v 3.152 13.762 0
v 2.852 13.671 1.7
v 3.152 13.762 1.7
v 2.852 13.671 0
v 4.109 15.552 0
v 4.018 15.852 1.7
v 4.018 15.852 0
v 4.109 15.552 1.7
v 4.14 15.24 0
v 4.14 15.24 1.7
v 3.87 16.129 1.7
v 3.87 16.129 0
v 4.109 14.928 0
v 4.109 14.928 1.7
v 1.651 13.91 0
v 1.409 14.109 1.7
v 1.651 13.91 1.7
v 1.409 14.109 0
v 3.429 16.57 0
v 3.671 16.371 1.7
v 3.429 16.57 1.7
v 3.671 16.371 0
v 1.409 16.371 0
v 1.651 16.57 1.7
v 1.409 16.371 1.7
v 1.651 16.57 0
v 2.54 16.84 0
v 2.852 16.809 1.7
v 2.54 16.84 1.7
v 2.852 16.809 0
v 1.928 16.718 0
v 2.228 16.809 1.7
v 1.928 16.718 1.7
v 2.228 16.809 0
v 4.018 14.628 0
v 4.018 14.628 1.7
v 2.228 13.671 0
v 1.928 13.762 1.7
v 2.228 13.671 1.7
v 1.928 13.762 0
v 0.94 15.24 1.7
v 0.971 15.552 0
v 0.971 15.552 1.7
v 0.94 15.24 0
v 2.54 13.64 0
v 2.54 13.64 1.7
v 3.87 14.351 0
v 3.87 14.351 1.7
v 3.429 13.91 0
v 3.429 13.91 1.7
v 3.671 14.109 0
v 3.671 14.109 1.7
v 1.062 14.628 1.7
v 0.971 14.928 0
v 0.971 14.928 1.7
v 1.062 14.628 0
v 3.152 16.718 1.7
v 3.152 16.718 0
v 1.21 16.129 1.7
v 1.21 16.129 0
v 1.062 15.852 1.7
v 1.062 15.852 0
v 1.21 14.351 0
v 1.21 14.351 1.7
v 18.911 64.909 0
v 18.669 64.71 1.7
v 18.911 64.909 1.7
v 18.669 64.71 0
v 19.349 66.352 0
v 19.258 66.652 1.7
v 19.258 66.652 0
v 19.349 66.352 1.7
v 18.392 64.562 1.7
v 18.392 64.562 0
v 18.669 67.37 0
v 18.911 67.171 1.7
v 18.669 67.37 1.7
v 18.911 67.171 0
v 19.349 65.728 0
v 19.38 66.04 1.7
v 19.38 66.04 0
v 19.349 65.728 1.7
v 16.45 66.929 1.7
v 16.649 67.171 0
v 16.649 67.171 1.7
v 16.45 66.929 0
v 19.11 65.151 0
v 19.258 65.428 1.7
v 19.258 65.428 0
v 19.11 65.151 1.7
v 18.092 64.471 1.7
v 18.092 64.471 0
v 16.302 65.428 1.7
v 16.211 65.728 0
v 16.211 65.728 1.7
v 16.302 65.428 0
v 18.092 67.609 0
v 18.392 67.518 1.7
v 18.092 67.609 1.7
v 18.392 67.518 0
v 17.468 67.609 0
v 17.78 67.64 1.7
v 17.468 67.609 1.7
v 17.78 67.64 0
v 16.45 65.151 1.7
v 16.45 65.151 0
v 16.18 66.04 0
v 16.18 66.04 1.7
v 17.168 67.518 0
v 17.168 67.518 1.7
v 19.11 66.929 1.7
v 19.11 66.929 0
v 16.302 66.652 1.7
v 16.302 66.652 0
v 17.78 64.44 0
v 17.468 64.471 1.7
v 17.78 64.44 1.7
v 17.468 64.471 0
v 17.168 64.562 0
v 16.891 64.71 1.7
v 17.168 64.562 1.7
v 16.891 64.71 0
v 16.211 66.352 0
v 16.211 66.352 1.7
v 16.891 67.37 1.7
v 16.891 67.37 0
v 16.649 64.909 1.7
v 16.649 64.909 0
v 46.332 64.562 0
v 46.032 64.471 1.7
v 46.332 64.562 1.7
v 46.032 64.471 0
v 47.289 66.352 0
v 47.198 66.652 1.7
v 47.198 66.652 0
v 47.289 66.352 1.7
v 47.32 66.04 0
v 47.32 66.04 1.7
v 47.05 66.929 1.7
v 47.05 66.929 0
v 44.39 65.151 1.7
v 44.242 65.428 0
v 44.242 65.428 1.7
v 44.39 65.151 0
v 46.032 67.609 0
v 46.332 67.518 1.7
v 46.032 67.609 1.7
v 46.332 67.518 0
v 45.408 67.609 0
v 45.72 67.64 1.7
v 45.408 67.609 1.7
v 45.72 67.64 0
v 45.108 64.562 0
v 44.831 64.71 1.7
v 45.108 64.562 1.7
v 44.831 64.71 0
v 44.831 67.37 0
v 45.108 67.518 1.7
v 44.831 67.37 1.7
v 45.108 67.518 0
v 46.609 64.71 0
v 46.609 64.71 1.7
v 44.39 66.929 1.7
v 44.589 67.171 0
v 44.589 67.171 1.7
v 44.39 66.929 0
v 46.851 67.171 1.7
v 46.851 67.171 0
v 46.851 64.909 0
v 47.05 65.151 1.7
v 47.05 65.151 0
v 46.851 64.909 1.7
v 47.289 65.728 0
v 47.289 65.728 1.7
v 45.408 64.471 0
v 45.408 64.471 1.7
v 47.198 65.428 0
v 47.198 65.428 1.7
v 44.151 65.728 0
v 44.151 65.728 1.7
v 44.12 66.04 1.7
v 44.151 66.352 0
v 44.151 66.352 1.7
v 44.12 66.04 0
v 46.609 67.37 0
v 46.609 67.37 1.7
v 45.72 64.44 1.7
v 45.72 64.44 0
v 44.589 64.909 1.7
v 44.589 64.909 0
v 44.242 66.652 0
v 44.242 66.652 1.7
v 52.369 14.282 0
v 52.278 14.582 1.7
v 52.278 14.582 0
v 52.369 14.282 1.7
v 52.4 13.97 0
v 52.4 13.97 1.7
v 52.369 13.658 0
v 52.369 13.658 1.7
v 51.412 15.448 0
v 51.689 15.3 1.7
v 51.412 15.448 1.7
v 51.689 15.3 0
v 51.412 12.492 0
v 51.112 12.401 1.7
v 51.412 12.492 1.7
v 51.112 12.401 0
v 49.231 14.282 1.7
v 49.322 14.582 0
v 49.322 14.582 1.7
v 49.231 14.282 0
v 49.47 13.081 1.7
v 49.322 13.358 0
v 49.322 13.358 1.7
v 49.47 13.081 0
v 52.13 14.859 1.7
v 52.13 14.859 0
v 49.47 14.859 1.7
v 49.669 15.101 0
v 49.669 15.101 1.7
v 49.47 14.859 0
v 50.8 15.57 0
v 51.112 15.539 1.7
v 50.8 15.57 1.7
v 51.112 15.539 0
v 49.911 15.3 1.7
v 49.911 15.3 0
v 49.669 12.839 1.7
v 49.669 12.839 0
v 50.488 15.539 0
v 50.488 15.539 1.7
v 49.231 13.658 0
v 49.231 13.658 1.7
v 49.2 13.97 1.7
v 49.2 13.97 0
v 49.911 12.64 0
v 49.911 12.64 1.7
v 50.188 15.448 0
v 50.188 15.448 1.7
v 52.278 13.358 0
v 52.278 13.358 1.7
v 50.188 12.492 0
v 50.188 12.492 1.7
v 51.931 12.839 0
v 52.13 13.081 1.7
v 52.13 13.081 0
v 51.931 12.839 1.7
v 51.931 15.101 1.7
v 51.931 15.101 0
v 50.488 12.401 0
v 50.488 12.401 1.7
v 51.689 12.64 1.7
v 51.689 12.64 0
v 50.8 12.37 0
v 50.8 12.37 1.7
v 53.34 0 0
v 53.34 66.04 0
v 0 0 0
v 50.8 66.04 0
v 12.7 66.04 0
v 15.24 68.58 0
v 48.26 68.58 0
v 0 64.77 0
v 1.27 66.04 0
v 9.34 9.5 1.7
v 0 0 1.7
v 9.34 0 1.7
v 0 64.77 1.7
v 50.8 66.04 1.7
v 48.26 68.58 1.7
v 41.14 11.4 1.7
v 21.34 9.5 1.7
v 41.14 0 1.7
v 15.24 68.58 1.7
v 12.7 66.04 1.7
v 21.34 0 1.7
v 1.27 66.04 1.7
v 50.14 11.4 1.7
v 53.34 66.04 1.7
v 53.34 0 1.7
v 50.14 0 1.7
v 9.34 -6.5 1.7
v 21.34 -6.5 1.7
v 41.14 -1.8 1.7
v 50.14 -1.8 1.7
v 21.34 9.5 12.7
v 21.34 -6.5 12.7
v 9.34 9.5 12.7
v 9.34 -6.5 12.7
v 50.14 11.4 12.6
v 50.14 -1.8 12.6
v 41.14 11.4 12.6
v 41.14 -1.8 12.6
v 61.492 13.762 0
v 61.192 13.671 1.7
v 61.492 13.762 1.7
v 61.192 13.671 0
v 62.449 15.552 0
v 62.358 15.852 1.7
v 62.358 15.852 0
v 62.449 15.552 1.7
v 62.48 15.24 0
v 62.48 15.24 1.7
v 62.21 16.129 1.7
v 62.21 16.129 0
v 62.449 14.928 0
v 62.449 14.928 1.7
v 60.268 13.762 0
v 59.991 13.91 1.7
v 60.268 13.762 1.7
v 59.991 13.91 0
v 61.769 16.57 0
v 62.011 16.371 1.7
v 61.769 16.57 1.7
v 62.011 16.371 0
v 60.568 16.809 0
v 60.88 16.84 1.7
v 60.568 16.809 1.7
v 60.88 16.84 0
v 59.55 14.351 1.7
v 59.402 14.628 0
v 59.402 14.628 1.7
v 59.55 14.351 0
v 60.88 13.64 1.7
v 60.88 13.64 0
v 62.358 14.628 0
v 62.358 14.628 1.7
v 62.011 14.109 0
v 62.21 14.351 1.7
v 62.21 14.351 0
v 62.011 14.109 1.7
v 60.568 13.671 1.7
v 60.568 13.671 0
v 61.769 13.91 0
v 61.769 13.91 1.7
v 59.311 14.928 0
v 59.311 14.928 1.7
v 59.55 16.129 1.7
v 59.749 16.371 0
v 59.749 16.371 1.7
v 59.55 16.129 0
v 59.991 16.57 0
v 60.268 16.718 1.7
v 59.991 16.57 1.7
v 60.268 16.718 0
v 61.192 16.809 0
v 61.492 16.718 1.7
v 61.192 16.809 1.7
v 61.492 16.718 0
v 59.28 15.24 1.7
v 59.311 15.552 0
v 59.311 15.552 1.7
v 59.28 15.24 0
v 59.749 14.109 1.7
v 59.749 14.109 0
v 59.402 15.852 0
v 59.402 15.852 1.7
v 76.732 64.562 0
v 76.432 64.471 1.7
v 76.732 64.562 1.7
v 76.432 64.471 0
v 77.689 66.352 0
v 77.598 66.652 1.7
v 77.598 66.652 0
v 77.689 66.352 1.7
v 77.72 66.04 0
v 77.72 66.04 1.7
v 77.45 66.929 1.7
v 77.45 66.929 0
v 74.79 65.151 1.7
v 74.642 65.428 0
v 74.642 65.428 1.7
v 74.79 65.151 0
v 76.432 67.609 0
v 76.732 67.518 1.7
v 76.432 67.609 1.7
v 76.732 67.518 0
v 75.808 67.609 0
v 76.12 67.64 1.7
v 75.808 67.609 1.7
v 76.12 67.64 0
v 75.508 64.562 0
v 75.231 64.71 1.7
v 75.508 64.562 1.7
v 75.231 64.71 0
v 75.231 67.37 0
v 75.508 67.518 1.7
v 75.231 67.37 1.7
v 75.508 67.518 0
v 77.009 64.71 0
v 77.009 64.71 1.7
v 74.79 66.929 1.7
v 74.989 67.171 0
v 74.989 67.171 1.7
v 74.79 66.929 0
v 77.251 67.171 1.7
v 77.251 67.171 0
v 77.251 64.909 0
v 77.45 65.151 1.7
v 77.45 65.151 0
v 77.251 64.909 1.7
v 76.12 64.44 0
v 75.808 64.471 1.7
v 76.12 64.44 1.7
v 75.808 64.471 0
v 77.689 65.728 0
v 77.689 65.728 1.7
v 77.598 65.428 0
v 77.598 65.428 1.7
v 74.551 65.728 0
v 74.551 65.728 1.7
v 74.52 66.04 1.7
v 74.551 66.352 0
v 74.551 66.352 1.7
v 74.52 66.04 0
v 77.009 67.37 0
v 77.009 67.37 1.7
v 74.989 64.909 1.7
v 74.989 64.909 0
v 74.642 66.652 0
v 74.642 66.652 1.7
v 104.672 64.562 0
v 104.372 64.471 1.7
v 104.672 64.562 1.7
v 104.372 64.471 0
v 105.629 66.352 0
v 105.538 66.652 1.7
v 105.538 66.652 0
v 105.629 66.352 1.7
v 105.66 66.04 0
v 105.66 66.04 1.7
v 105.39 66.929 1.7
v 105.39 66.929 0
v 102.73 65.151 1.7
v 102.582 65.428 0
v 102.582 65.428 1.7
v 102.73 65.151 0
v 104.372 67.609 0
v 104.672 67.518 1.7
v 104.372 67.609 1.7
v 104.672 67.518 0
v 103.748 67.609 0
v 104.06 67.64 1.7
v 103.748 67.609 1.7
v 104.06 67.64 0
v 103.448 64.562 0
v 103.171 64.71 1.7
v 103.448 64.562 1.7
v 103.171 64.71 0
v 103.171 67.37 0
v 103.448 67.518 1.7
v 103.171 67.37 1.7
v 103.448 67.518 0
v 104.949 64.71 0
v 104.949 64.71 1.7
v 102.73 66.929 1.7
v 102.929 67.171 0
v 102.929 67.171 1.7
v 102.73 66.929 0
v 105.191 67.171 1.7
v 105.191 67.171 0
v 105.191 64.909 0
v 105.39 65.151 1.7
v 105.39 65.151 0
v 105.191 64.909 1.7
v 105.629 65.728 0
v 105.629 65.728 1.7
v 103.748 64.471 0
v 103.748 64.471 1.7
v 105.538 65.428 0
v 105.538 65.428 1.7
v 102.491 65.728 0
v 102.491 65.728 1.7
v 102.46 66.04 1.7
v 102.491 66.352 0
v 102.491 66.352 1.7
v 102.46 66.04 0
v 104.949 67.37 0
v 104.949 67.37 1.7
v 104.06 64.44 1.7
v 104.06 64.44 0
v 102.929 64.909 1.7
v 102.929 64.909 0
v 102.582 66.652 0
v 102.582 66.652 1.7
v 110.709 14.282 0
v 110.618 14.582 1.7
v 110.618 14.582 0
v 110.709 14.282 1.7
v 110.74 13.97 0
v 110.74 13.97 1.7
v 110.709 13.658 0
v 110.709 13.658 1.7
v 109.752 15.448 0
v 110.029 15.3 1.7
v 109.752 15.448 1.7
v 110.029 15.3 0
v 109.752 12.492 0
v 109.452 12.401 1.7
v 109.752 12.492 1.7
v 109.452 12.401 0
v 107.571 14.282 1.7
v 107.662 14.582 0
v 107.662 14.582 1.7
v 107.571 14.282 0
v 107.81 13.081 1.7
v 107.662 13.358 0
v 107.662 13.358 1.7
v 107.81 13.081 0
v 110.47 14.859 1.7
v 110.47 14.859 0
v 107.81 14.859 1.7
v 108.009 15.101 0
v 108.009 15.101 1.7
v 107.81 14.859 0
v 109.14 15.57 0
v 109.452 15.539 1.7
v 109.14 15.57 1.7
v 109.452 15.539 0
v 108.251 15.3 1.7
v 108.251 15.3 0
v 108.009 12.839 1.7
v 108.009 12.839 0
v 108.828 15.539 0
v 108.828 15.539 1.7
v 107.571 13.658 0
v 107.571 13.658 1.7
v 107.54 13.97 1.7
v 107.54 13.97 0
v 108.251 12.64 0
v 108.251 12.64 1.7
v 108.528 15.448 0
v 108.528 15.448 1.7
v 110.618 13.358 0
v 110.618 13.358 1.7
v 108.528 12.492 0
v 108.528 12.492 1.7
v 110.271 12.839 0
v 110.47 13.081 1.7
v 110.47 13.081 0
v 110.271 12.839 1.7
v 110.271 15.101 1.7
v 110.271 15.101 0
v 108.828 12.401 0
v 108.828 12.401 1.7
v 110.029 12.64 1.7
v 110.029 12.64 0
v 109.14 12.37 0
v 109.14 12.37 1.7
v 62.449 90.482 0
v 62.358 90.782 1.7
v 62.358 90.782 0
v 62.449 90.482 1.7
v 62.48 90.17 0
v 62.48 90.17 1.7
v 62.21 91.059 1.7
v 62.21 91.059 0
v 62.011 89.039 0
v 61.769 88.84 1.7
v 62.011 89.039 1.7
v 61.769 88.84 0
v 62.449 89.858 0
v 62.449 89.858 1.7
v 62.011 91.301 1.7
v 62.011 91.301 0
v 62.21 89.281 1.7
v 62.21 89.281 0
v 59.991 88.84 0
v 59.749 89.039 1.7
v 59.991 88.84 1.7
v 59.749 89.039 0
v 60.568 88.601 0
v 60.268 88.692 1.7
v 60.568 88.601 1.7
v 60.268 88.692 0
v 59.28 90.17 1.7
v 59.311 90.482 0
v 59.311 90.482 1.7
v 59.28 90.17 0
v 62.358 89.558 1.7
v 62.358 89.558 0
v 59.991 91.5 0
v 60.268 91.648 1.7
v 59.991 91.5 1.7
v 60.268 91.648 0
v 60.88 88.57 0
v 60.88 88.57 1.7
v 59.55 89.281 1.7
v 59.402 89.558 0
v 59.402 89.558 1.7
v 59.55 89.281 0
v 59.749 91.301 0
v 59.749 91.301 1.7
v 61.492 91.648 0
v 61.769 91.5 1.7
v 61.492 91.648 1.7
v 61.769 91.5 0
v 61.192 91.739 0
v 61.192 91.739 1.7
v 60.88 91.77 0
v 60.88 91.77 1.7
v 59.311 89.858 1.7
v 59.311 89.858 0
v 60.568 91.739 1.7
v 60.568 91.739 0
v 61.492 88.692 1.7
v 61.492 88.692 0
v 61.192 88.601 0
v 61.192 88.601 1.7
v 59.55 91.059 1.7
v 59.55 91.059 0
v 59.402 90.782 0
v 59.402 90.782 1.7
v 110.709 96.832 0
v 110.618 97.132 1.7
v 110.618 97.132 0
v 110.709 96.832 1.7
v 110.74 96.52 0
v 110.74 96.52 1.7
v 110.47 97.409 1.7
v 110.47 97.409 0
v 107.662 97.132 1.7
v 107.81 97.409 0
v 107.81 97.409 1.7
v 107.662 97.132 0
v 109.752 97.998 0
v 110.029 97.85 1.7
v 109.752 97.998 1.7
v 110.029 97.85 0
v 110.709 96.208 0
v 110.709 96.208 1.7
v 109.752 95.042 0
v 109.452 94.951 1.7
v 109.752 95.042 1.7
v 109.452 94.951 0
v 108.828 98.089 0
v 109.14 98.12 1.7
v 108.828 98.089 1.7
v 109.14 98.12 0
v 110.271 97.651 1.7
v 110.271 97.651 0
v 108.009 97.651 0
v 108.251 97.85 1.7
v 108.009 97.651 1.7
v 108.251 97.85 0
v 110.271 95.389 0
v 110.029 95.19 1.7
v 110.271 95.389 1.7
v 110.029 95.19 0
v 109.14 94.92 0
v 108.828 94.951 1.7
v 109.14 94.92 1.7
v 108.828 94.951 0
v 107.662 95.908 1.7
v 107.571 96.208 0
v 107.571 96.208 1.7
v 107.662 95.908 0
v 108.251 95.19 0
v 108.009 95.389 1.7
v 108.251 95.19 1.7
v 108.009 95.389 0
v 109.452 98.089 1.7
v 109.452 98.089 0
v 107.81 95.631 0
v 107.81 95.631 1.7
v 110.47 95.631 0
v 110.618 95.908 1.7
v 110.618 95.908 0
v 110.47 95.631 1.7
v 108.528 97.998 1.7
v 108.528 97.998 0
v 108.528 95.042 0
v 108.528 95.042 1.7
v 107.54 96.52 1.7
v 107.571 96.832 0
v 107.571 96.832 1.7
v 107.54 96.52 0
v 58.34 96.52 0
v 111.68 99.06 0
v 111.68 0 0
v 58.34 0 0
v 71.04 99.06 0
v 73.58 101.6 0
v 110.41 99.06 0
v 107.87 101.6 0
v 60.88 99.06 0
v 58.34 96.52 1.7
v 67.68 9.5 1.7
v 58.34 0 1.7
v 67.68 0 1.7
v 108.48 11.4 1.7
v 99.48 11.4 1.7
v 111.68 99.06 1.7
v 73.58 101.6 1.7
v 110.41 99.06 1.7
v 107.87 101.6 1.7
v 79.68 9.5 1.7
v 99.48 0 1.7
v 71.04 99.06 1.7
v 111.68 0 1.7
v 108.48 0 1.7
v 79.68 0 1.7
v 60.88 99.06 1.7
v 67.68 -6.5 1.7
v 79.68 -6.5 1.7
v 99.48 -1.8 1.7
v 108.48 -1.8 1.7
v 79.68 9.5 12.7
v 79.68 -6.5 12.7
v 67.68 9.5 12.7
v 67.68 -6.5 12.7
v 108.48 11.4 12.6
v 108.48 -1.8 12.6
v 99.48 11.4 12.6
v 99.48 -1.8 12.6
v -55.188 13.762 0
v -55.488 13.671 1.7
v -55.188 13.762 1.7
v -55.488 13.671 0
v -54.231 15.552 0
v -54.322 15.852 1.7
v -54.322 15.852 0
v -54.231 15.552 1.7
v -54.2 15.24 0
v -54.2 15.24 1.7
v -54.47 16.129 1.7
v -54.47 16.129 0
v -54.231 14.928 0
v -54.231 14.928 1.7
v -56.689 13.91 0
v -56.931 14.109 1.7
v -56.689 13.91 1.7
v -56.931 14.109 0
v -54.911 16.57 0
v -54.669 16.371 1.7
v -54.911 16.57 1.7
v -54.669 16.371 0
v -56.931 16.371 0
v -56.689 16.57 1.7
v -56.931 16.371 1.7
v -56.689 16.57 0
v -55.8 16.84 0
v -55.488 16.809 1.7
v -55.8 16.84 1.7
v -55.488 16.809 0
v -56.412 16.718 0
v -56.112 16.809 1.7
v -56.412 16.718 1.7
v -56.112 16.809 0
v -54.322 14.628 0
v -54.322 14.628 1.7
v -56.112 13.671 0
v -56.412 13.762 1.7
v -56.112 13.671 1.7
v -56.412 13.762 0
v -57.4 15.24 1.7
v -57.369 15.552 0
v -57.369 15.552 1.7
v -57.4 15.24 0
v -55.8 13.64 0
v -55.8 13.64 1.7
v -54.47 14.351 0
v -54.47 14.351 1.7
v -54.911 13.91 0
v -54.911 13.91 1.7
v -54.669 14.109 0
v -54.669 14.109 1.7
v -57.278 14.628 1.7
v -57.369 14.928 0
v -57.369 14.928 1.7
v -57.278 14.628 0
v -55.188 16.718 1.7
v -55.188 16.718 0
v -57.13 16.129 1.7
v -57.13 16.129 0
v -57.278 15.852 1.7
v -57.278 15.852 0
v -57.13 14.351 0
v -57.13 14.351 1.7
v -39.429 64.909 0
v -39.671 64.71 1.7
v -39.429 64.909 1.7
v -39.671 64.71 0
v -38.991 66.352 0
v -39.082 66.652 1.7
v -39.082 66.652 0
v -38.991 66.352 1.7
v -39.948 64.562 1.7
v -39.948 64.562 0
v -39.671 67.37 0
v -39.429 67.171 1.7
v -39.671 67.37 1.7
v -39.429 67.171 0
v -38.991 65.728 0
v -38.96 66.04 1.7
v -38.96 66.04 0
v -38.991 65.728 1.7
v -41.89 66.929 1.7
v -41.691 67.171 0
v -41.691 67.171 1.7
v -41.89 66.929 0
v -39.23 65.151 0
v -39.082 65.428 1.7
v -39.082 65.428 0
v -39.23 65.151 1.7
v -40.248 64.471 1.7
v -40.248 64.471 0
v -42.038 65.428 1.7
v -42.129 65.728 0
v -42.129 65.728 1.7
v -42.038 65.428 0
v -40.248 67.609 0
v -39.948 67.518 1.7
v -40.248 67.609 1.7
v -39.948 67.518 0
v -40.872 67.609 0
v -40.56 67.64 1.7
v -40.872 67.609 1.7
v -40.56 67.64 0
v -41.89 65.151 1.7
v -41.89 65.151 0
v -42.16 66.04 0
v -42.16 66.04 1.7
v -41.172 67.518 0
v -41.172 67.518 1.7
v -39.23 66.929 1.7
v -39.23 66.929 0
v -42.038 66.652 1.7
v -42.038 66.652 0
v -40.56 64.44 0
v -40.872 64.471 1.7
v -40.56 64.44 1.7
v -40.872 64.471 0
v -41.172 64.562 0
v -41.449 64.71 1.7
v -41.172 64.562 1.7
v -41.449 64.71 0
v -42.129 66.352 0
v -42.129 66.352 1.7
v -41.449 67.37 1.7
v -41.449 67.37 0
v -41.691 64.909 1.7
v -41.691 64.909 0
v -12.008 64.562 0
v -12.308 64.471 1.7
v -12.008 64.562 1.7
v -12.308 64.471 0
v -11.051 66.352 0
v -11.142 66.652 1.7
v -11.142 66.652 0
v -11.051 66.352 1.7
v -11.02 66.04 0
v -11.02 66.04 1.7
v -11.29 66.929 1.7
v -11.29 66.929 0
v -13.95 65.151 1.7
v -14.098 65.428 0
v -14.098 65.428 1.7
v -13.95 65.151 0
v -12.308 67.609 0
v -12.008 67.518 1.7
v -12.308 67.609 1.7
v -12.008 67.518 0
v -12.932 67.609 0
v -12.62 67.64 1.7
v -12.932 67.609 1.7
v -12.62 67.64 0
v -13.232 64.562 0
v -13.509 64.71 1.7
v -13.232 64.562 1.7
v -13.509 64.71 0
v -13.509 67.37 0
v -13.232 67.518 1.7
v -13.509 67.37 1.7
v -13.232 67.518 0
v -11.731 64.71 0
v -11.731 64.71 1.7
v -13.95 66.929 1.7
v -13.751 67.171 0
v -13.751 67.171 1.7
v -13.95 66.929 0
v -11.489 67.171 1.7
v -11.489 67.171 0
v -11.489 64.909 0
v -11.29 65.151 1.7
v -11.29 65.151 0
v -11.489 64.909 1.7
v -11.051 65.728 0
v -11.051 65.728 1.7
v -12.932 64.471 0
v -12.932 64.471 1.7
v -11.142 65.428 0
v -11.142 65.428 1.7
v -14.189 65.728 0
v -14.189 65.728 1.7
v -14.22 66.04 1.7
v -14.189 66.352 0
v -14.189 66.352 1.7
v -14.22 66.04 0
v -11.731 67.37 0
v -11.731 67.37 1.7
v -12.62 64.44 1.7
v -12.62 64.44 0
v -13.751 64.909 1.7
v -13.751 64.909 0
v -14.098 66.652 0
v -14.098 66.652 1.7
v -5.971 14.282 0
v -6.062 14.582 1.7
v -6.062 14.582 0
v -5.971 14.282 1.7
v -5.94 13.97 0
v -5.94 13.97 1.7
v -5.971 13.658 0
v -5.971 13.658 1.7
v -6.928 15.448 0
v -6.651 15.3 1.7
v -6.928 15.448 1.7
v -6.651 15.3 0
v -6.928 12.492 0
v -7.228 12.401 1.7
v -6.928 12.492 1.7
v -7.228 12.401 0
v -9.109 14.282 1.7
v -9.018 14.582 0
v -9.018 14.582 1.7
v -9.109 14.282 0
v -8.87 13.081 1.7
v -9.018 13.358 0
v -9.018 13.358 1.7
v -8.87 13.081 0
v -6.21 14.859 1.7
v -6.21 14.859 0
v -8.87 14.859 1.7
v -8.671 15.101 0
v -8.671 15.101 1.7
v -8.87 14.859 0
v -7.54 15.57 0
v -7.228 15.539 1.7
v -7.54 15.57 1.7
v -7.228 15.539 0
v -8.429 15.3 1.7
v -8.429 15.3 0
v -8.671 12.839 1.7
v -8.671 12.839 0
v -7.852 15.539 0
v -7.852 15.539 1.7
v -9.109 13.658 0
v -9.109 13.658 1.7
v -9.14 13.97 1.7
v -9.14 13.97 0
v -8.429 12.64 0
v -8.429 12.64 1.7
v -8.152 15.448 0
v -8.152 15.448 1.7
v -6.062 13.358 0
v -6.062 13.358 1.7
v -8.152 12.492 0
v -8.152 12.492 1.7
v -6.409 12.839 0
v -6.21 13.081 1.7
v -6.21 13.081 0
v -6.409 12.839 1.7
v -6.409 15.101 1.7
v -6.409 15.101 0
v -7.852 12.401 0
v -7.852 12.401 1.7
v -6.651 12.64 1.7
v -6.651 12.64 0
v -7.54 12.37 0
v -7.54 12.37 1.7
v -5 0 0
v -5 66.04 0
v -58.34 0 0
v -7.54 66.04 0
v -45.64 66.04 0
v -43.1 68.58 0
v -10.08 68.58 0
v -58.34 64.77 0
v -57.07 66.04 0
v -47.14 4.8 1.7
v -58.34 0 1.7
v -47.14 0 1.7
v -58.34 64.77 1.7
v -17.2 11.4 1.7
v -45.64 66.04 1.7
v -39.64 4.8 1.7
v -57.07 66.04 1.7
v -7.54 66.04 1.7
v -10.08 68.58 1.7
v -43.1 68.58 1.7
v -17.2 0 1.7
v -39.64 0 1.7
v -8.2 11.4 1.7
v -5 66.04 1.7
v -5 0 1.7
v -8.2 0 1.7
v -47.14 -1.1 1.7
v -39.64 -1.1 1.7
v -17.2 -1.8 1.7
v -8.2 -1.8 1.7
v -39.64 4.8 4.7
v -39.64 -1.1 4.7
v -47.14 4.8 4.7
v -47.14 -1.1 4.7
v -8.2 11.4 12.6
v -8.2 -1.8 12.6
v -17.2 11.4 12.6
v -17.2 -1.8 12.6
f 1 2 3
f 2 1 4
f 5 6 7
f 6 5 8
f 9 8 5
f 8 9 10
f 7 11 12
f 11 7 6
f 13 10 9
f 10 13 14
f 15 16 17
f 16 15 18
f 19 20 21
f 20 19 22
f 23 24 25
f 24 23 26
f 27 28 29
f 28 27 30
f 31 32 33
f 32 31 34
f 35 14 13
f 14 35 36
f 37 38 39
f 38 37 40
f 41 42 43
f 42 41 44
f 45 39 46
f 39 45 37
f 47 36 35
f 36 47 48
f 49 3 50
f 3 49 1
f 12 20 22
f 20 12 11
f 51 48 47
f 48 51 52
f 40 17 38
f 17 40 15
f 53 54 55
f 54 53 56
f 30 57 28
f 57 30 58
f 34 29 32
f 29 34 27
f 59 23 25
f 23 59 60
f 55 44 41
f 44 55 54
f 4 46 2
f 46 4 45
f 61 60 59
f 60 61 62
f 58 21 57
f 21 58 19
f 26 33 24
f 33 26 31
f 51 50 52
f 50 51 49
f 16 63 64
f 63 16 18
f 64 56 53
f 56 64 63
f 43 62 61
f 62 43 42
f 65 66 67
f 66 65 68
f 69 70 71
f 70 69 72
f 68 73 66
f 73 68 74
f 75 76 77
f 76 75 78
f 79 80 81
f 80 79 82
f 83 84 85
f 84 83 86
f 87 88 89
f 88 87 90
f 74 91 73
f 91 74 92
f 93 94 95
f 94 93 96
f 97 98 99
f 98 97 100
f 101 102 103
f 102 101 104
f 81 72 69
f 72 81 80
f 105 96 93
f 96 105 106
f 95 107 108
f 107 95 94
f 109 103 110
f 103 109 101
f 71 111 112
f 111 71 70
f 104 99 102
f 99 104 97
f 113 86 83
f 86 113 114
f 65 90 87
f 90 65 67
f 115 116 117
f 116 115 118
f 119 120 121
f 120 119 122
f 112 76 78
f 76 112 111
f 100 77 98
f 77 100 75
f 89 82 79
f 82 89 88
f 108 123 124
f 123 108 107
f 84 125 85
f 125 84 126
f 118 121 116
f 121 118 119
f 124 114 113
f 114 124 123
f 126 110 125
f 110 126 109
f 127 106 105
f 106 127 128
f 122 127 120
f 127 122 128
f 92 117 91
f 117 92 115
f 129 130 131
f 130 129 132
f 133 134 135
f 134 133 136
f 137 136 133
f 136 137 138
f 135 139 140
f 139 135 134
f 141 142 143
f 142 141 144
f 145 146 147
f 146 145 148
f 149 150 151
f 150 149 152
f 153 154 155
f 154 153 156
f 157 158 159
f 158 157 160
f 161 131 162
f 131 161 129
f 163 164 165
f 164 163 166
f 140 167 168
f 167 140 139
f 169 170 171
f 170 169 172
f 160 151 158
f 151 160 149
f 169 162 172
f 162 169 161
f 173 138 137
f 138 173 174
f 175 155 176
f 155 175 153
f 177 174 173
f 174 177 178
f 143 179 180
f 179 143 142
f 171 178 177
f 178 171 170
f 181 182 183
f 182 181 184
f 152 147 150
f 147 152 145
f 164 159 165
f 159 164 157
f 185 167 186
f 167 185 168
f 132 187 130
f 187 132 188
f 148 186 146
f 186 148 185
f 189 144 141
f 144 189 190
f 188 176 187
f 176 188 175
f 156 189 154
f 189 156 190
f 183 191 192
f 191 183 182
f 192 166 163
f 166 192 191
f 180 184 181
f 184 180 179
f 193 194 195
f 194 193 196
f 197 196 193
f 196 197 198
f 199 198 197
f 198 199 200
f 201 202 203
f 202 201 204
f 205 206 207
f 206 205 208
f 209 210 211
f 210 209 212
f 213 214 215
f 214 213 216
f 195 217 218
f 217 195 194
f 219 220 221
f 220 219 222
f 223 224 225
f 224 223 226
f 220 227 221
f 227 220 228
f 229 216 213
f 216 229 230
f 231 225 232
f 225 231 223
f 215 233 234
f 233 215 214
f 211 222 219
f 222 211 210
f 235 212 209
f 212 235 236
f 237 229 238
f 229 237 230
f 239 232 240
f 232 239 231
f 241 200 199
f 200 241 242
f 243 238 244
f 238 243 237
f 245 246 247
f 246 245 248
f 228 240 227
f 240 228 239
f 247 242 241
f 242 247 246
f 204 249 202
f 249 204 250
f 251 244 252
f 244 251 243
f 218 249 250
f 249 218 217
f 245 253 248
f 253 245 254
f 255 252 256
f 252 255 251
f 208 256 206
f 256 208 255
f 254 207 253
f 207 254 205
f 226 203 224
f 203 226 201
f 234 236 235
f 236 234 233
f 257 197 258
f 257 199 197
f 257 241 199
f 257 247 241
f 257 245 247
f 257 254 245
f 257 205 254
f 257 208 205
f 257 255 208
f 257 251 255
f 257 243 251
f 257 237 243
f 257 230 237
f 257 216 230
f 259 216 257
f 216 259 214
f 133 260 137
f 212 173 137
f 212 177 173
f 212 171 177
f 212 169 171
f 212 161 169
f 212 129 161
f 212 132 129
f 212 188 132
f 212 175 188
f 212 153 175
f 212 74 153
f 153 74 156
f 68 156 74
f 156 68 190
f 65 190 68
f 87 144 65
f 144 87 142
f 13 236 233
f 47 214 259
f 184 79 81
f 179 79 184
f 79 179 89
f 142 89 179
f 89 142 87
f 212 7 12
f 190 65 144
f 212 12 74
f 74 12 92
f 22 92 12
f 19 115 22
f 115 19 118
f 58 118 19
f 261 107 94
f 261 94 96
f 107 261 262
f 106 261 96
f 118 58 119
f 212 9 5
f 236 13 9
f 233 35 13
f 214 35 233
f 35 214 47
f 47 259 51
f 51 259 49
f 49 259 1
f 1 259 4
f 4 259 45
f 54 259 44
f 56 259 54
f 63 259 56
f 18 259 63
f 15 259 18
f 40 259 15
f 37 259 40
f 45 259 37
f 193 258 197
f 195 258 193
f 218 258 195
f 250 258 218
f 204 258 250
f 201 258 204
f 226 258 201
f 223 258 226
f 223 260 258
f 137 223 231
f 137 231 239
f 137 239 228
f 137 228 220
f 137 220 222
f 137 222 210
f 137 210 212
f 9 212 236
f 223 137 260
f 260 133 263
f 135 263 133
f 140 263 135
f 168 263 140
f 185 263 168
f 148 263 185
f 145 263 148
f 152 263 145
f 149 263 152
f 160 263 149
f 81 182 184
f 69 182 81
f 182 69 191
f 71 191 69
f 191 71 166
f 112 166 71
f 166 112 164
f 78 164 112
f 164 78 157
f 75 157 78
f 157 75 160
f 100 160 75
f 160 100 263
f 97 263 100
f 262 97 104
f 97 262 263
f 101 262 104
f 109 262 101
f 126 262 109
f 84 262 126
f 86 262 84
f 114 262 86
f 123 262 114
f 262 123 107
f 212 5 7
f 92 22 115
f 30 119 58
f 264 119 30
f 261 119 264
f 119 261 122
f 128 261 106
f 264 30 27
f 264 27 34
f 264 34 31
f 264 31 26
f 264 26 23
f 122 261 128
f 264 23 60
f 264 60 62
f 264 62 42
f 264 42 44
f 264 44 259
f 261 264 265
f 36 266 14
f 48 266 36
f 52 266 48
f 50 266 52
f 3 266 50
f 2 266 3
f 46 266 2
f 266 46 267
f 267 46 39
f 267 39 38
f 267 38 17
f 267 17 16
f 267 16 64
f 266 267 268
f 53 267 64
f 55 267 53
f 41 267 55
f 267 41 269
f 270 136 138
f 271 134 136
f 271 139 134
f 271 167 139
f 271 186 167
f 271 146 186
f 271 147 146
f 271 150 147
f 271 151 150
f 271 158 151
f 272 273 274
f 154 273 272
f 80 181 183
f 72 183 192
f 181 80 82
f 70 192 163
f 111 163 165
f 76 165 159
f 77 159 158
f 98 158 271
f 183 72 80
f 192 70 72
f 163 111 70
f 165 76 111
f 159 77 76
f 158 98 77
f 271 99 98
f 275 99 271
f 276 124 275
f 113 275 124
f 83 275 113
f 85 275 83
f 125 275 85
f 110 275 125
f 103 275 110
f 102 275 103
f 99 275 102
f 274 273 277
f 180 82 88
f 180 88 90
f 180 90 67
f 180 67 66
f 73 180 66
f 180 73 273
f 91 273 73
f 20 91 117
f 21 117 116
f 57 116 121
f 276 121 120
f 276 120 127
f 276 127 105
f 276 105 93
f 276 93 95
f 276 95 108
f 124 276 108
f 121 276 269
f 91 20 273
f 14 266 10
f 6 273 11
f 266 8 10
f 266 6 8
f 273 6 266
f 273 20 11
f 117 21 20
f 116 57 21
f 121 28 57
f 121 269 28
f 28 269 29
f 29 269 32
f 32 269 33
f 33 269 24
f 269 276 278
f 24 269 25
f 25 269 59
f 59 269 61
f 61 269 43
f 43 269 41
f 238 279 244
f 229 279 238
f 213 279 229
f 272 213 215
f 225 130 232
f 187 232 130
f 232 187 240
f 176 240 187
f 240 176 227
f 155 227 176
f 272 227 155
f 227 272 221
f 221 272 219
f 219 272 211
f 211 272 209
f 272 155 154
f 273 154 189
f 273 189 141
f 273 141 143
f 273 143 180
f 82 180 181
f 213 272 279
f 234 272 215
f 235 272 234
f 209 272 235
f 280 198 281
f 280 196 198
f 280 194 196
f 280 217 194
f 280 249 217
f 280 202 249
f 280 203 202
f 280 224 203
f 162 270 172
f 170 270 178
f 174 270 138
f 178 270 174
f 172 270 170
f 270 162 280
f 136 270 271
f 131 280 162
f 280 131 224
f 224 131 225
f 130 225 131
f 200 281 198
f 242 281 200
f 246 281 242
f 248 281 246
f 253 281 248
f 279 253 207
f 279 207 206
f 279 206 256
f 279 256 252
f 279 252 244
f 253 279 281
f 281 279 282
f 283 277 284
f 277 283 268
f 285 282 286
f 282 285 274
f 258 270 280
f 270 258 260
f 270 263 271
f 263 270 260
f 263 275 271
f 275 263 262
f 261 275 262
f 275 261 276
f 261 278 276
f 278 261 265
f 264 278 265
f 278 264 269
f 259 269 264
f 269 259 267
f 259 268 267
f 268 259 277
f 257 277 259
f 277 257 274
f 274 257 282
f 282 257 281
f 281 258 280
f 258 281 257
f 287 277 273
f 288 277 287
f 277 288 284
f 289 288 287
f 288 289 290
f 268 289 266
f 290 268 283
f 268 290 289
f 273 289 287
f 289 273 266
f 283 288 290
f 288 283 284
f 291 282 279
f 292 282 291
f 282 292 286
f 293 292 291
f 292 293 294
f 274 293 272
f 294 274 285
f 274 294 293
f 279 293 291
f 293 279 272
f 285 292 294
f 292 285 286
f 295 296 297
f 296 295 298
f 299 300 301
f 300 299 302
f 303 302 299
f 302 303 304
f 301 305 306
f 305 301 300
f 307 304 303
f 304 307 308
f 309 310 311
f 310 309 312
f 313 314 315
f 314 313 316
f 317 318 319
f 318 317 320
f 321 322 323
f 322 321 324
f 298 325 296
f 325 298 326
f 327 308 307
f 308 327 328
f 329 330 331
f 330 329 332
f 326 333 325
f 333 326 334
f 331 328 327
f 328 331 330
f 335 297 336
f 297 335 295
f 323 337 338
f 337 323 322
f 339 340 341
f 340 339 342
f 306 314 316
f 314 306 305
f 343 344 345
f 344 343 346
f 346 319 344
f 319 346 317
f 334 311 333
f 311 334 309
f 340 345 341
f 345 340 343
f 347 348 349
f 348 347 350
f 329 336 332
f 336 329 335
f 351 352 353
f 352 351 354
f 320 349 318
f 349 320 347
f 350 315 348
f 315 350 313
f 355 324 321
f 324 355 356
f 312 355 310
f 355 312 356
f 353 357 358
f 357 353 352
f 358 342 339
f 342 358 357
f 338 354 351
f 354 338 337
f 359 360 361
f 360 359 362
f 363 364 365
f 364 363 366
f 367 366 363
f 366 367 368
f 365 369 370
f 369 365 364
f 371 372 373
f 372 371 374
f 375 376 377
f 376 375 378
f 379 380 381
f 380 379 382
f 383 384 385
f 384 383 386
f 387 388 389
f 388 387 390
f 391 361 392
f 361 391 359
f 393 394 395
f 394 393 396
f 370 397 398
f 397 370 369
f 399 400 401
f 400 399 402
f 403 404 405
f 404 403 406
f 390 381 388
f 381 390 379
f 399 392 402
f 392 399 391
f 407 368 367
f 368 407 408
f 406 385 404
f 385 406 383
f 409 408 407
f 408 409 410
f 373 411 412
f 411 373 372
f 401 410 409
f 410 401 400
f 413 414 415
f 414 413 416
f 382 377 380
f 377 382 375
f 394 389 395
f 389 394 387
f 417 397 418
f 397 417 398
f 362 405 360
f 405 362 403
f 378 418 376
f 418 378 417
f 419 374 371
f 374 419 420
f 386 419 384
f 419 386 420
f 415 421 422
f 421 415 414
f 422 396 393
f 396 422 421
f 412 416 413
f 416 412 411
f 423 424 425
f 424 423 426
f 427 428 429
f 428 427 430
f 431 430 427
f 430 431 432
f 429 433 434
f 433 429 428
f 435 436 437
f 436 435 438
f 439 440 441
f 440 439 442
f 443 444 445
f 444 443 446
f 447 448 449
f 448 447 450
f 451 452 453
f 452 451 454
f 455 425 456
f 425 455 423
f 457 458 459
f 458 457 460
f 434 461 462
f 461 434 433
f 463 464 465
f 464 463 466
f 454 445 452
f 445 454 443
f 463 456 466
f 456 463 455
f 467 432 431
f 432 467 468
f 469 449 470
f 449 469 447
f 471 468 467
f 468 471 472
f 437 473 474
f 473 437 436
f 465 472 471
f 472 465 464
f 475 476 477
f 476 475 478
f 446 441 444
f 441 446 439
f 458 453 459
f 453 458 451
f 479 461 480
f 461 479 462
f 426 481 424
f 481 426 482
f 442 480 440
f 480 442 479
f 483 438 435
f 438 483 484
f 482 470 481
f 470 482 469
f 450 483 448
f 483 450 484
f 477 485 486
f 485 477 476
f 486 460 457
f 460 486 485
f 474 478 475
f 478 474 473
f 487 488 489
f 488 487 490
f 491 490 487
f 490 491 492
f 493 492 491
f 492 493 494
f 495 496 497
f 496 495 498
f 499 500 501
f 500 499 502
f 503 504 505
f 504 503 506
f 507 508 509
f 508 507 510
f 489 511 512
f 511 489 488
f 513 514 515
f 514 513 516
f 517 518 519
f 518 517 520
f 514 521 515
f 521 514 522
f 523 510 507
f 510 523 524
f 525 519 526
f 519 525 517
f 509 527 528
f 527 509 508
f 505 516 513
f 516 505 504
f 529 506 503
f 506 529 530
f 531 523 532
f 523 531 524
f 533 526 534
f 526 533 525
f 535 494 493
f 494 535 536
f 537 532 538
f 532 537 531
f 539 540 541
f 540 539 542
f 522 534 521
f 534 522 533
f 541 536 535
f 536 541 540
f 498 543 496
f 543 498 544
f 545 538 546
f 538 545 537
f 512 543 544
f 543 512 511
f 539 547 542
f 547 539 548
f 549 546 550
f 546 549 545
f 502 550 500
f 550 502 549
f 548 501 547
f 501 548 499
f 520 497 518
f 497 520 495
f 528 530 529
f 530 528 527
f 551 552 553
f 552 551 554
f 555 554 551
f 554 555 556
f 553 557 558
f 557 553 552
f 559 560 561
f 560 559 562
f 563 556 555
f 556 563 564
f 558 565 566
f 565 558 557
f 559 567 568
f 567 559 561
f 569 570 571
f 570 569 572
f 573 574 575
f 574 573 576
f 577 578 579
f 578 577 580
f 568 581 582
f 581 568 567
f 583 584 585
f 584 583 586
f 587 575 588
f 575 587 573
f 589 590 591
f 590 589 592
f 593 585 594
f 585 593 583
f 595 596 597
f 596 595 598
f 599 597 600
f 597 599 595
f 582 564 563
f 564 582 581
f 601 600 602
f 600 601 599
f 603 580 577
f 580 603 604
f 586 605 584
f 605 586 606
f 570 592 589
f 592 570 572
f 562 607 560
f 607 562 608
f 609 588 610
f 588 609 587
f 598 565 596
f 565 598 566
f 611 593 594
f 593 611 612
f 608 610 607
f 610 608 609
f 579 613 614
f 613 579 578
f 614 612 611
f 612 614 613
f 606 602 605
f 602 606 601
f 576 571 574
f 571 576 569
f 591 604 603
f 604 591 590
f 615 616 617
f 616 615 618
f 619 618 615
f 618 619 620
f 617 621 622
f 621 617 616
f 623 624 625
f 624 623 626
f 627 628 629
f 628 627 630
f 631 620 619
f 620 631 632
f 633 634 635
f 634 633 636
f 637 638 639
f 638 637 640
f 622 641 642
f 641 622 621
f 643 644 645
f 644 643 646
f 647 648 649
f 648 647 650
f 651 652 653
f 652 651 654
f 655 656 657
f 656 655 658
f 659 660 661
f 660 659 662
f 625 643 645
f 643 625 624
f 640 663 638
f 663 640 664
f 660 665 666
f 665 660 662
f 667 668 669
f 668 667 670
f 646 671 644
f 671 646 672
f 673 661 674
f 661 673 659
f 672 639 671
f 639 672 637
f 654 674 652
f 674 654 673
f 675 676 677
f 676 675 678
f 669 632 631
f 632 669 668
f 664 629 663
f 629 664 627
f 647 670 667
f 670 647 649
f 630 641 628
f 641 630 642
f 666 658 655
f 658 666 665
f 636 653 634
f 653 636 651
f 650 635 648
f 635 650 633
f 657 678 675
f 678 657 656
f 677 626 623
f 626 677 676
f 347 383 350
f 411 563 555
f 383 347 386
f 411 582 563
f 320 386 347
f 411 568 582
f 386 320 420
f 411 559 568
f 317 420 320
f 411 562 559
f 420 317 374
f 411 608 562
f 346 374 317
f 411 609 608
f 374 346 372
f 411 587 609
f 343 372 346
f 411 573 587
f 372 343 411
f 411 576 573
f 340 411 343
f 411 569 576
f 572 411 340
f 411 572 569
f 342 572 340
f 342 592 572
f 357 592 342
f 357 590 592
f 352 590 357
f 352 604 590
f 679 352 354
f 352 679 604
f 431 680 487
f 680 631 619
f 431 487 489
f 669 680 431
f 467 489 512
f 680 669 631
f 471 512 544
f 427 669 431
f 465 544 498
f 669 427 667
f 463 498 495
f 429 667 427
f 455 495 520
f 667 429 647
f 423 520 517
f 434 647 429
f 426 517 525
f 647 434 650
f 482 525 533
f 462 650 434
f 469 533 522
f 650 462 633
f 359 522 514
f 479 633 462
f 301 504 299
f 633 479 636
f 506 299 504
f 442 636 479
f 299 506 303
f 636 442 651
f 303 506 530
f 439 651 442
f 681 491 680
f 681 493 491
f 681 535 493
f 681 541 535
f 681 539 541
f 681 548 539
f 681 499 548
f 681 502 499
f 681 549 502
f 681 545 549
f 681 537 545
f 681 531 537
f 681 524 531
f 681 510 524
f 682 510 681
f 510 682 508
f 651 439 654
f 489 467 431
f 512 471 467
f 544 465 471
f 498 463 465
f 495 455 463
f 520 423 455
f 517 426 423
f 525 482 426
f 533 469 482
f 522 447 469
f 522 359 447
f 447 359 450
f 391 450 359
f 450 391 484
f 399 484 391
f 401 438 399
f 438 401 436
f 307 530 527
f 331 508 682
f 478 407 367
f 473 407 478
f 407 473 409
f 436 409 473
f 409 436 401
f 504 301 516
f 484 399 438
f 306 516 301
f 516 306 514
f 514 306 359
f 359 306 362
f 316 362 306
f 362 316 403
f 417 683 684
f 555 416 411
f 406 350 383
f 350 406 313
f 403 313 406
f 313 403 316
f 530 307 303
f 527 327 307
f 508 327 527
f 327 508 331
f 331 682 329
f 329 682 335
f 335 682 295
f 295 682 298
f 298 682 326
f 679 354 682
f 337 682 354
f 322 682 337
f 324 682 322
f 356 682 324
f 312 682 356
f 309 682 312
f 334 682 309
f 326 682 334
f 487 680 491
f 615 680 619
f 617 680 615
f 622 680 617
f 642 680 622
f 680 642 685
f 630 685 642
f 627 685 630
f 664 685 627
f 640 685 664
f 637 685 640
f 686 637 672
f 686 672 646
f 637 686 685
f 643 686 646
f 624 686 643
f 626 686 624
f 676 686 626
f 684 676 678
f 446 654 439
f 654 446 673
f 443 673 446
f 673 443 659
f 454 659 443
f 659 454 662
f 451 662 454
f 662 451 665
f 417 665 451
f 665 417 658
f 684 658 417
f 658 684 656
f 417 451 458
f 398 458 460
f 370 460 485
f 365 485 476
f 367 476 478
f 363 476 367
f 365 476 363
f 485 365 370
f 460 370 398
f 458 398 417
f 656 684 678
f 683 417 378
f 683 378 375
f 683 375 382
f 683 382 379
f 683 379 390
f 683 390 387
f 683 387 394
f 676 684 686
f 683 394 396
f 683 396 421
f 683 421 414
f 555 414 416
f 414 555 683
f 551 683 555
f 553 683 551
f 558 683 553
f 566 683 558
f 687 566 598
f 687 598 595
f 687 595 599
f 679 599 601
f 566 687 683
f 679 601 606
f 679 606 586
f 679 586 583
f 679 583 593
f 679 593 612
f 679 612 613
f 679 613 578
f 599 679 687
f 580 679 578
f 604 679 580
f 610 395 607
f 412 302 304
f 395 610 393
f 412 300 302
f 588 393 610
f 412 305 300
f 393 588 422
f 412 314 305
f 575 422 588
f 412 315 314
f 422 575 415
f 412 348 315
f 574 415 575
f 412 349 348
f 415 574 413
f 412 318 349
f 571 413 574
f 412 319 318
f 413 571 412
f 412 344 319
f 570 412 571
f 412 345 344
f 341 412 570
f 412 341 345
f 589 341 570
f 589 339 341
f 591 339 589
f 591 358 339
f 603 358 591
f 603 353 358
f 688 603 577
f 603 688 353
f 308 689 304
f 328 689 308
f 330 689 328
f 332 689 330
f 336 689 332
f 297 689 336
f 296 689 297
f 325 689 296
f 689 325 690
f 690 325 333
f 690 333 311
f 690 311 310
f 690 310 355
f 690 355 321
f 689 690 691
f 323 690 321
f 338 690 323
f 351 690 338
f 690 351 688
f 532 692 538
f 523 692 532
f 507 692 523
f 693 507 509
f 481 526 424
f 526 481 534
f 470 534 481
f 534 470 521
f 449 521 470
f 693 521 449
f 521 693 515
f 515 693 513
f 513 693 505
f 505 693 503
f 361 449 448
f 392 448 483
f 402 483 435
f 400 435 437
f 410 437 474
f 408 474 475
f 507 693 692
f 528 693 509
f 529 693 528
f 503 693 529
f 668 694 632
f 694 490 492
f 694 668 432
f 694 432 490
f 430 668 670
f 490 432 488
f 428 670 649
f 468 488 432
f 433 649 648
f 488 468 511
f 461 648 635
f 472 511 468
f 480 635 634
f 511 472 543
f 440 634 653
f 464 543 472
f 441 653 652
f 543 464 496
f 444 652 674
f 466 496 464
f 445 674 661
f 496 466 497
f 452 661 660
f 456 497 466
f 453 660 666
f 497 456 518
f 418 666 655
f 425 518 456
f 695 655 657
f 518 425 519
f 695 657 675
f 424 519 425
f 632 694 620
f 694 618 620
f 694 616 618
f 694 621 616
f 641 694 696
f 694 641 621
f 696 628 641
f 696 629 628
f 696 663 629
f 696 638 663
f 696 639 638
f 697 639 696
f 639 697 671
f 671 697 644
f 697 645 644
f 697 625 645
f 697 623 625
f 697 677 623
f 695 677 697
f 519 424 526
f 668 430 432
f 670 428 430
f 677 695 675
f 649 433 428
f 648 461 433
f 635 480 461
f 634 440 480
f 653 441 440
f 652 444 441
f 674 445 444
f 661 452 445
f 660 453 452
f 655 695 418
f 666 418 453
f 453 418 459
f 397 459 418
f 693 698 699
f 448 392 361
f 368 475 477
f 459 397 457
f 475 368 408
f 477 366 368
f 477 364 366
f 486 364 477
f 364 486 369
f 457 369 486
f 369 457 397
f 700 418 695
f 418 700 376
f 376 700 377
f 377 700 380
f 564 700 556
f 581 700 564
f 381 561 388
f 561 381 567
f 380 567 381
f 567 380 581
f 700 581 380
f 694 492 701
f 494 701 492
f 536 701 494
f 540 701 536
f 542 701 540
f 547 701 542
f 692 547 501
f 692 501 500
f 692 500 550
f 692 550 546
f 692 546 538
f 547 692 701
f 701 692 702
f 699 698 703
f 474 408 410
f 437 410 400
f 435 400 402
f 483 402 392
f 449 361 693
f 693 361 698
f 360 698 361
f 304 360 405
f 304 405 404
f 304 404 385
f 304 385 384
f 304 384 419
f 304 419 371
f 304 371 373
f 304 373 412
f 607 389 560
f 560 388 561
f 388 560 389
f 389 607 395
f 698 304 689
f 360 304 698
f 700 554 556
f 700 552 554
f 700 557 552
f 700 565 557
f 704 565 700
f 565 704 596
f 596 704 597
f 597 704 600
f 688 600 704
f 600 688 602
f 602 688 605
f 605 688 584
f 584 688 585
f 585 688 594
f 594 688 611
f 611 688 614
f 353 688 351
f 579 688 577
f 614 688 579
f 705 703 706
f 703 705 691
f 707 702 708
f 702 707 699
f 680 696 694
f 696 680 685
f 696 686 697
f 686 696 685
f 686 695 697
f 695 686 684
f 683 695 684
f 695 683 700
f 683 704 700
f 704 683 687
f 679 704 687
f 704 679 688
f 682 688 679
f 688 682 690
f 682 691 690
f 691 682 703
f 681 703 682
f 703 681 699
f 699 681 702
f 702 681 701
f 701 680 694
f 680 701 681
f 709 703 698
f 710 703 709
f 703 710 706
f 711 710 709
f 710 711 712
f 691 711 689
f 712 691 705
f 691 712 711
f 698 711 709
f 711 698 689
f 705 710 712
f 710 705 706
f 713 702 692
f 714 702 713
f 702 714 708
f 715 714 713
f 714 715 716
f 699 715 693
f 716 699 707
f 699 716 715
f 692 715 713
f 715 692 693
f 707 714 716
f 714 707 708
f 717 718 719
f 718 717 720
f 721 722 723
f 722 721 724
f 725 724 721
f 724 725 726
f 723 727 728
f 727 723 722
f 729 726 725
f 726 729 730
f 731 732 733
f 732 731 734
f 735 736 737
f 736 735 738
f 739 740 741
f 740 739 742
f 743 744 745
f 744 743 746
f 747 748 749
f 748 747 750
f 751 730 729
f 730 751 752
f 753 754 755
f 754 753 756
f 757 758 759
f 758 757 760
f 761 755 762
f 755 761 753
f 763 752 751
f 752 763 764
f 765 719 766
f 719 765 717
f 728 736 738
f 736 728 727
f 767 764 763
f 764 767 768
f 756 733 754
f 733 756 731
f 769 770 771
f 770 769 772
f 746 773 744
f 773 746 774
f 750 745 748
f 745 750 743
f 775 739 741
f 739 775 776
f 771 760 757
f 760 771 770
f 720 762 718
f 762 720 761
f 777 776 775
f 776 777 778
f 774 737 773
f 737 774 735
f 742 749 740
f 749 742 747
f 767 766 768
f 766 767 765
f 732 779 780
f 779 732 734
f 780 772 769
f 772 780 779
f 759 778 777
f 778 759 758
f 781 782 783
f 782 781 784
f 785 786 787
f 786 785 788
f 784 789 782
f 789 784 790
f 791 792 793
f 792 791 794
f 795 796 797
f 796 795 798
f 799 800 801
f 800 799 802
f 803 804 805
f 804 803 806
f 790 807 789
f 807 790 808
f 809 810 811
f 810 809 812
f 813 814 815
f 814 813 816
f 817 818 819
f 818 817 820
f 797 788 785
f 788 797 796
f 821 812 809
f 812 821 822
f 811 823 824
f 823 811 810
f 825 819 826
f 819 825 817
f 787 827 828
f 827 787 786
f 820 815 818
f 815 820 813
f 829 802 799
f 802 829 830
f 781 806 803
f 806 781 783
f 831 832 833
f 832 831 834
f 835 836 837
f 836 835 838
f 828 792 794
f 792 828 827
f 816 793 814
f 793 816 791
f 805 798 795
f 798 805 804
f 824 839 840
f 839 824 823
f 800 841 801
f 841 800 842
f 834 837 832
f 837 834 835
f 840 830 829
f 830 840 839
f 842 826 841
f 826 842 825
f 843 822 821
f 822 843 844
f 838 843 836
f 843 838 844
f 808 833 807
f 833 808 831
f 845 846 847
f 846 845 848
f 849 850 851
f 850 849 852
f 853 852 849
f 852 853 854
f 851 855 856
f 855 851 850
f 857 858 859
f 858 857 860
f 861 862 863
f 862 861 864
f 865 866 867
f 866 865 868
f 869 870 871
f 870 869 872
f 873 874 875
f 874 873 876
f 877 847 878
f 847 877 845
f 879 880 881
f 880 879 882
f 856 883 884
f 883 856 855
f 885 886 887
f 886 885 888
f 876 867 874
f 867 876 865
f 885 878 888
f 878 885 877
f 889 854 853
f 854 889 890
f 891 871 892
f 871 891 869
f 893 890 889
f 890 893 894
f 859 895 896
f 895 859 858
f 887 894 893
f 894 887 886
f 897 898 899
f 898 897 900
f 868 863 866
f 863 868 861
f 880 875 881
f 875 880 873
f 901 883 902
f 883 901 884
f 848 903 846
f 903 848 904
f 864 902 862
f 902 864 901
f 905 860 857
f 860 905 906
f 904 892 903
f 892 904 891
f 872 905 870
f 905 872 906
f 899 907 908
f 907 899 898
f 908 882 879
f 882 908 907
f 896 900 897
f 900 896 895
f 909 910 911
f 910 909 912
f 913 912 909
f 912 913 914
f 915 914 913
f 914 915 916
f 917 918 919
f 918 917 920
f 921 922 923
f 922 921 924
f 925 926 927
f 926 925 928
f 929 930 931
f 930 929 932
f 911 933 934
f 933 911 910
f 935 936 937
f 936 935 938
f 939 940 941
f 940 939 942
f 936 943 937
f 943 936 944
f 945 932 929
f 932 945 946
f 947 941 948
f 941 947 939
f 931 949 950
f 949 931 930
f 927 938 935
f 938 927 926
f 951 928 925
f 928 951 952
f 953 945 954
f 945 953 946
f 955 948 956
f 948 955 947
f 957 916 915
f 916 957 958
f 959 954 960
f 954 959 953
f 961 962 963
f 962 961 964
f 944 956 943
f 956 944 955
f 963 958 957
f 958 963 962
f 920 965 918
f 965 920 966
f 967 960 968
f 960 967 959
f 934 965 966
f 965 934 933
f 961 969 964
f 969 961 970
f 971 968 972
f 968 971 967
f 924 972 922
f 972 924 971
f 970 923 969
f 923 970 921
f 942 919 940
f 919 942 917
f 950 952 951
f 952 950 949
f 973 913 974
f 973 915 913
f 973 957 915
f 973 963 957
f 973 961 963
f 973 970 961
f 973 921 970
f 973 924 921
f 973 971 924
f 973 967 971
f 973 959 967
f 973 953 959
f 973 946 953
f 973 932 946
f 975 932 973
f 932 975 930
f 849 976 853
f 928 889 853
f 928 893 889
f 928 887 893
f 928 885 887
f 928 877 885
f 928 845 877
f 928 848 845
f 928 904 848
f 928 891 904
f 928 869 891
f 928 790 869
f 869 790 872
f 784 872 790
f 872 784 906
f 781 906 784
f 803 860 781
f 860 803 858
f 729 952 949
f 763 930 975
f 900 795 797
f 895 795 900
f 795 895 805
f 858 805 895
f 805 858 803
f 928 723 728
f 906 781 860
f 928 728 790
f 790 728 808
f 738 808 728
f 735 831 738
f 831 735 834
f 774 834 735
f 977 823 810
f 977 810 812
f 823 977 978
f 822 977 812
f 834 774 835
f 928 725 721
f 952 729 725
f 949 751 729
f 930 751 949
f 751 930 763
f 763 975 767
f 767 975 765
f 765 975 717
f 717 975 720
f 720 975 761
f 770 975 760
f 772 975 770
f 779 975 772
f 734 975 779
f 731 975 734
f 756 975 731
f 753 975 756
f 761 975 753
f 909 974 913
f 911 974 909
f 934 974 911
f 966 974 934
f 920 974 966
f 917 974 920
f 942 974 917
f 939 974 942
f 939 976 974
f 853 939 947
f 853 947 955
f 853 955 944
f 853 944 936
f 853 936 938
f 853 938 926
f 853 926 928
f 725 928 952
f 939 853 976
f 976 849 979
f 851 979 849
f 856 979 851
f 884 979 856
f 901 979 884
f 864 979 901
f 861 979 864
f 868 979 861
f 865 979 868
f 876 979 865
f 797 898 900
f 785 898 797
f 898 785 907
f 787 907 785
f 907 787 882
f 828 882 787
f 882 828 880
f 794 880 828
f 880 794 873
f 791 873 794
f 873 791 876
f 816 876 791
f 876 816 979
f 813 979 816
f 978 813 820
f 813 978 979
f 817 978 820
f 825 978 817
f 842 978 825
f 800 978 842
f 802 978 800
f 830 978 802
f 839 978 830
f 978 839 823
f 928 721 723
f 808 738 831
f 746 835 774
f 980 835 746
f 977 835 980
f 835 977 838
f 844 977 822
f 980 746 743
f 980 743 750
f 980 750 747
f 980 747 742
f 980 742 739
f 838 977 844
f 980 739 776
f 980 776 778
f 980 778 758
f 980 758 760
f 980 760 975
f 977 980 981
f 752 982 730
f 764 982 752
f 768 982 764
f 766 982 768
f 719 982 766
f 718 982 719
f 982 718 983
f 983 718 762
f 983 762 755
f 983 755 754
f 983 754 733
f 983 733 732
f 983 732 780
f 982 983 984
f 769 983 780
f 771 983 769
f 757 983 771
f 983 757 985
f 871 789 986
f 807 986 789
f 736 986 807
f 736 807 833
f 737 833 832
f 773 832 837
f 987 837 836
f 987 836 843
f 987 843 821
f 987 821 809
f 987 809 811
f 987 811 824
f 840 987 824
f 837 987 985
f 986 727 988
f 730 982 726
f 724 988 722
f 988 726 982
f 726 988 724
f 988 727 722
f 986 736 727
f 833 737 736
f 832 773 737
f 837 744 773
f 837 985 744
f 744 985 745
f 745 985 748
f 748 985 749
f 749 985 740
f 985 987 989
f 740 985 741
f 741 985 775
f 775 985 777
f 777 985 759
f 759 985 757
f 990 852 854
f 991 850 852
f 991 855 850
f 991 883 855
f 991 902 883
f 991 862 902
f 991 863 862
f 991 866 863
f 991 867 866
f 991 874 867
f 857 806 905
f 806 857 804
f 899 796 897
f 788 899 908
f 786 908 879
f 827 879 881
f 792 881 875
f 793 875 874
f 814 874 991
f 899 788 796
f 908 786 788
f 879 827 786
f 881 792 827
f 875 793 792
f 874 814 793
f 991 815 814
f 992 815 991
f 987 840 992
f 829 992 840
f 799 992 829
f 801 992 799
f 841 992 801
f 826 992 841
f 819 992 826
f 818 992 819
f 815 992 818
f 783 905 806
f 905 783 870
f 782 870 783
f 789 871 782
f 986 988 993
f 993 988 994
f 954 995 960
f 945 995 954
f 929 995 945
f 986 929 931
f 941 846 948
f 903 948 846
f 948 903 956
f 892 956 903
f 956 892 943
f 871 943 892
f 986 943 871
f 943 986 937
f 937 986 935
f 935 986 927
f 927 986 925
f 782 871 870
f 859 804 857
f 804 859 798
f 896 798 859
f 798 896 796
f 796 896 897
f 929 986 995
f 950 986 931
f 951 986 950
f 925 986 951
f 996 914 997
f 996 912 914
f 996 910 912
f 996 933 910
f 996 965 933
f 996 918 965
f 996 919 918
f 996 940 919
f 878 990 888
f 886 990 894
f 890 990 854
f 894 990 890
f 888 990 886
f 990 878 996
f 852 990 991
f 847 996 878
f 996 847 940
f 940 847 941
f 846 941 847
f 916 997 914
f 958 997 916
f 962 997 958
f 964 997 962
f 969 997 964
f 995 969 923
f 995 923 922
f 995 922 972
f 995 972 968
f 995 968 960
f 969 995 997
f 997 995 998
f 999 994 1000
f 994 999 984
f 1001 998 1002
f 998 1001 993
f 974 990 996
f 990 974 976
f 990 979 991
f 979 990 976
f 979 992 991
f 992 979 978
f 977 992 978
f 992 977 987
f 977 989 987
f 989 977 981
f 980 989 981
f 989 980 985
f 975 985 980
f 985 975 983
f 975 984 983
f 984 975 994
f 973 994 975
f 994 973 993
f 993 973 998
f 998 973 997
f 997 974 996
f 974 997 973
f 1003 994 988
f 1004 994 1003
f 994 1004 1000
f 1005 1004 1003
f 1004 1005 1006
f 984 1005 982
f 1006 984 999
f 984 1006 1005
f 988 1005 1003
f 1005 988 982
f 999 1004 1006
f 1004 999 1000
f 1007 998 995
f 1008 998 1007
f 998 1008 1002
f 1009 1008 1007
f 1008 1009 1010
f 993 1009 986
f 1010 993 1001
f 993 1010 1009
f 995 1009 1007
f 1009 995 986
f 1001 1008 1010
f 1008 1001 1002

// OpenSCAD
arduino();
translate([arduinoWidth + 5, 0, 0])
	arduino("Due");
translate([-(arduinoWidth + 5), 0, 0])
	arduino("Leonardo");

//Constructs a roughed out arduino board
//Current only USB and power on the board but will add headers later
module arduino(boardType = "Uno") {
	//The PCB with holes
	difference() {
		boardShape( boardType );
		translate([0,0,-boardHeight * 0.5]) holePlacement(boardType = boardType)
			cylinder(r = mountingHoleRadius, h = boardHeight * 2, $fn=32);
	}

	//USB
	usb( boardType = boardType );

	//Power supply
	power();

	//Headers
}

module boundingBox(boardType = "Uno") {

}

//Creates standsoff for different boards
module standoffs( boardType = "Uno", height = 10, topRadius = mountingHoleRadius + 1, bottomRadius =  mountingHoleRadius + 2, tapHole = mountingHoleRadius * 0.75 ) {
	holePlacement(boardType = boardType)
		difference() {
			cylinder(r1 = bottomRadius, r2 = topRadius, h = height, $fn=32);
			cylinder(r =  tapHole, h = height * 4, center = true, $fn=32);
		}
}

//Offset from board. Negative values are insets
module boardShape( boardType = "Uno", offset = 0, height = boardHeight ) {
	xScale = (arduinoWidth + offset * 2) / arduinoWidth;
	yScaleUno = (unoDepth + offset * 2) / unoDepth;
	yScaleDue = (dueDepth + offset * 2) / dueDepth;

	translate([-offset, -offset, 0])
	if( boardType == "Leonardo" || boardType == "Uno" || boardType == "NG" || boardType == "Diecimila" || boardType == "Duemilanove" ) {
		scale([xScale, yScaleUno, 1.0])
			linear_extrude(height = height) 
				polygon(points = unoBoardPath);
	} else if ( boardType == "Mega 2560" || boardType == "Due" || boardType == "Mega" ) {
		scale([xScale, yScaleDue, 1.0])
			linear_extrude(height = height) 
				polygon(points = dueBoardPath);
	} else {
		echo("Board type not found!");
	}
	
}



//This is used for placing the mounting holes 
//child elements will be centered on that chosen boards mounting hole centers
//Used as the basis for making standoffs
module holePlacement(boardType = "Uno" ) {
	if( boardType == "Leonardo" || boardType == "Uno" ) {
		for(i = unoHoles ) {
			translate(i)
				child(0);
		}
	} else if ( boardType == "NG" || boardType == "Diecimila" || boardType == "Duemilanove" ) {
		for(i = ngHoles ) {
			translate(i)
				child(0);	
		}
	} else if ( boardType == "Mega 2560" || boardType == "Due" ) {
		for(i = dueHoles ) {
			translate(i)
				child(0);	
		}
	} else if ( boardType == "Mega" ) {
		for(i = megaHoles ) {
			translate(i)
				child(0);	
		}
	} else {
		echo("Board type not found");
	}
}

//Rough out USB for particular board extend extends the cube off the board beyond the usb port dimensions, 
//offset gives a border around the usb port (x and y ) These are good for making punch outs
module usb( boardType = "Uno", extend = 0, offset = 0 ) {
	if( boardType == "Leonardo" ) {
		//Mini-B USB
		translate([11.2 - offset, -(1.1 + extend ), boardHeight - offset])
			cube([7.5 + offset, 5.9 + extend, 3 + offset]);
	} else {
		//B USB
		translate([9.34 - offset, -(6.5 + extend), boardHeight - offset]) 
			cube([12 + offset * 2, 16 + extend, 11 + offset * 2]);
	}
}

//similar to usb function but for the power jack
module power( boardType = "Uno", extend = 0, offset = 0 ) {
	translate([41.14 - offset,-(1.8 + extend), boardHeight - offset])
		cube([9 + offset * 2, 13.2 + extend, 10.9 + offset * 2]);
}

module headers( boardType = "Uno", extend = 0, offset = 0 ) {

}



//Arduino dimensions

boardHeight = 1.7;

arduinoWidth = 53.34;
unoDepth = 68.58;
dueDepth = 101.6;
arduinoHeight = 11 + boardHeight;

mountingHoleRadius = 3.2 / 2;

headerWidth = 0;
headerDepth = 0;
headerHeight = 9;



unoBoardPath = [ 
		[  0.0, 0.0 ],
		[  53.34, 0.0 ],
		[  53.34, 66.04 ],
		[  50.8, 66.04 ],
		[  48.26, 68.58 ],
		[  15.24, 68.58 ],
		[  12.7, 66.04 ],
		[  1.27, 66.04 ],
		[  0.0, 64.77 ]
		];

dueBoardPath = [ 
		[  0.0, 0.0 ],
		[  53.34, 0.0 ],
		[  53.34, 99.06 ],
		[  52.07, 99.06 ],
		[  49.53, 101.6 ],
		[  15.24, 101.6 ],
		[  12.7, 99.06 ],
		[  2.54, 99.06 ],
		[  0.0, 96.52 ]
		];

//Duemilanove, Diecimila, NG and earlier
ngHoles = [
		[  2.54, 15.24 ],
		[  17.78, 66.04 ],
		[  45.72, 66.04 ]
		];

//Uno, Leonardo holes
unoHoles = [
		[  2.54, 15.24 ],
		[  17.78, 66.04 ],
		[  45.72, 66.04 ],
		[  50.8, 13.97 ]
		];



//Due and Mega 2560
dueHoles = [
		[  2.54, 15.24 ],
		[  17.78, 66.04 ],
		[  45.72, 66.04 ],
		[  50.8, 13.97 ],
		[  2.54, 90.17 ],
		[  50.8, 96.52 ]
		];

// Original Mega holes
megaHoles = [
		[  2.54, 15.24 ],
		[  50.8, 13.97 ],
		[  2.54, 90.17 ],
		[  50.8, 96.52 ]
		];
